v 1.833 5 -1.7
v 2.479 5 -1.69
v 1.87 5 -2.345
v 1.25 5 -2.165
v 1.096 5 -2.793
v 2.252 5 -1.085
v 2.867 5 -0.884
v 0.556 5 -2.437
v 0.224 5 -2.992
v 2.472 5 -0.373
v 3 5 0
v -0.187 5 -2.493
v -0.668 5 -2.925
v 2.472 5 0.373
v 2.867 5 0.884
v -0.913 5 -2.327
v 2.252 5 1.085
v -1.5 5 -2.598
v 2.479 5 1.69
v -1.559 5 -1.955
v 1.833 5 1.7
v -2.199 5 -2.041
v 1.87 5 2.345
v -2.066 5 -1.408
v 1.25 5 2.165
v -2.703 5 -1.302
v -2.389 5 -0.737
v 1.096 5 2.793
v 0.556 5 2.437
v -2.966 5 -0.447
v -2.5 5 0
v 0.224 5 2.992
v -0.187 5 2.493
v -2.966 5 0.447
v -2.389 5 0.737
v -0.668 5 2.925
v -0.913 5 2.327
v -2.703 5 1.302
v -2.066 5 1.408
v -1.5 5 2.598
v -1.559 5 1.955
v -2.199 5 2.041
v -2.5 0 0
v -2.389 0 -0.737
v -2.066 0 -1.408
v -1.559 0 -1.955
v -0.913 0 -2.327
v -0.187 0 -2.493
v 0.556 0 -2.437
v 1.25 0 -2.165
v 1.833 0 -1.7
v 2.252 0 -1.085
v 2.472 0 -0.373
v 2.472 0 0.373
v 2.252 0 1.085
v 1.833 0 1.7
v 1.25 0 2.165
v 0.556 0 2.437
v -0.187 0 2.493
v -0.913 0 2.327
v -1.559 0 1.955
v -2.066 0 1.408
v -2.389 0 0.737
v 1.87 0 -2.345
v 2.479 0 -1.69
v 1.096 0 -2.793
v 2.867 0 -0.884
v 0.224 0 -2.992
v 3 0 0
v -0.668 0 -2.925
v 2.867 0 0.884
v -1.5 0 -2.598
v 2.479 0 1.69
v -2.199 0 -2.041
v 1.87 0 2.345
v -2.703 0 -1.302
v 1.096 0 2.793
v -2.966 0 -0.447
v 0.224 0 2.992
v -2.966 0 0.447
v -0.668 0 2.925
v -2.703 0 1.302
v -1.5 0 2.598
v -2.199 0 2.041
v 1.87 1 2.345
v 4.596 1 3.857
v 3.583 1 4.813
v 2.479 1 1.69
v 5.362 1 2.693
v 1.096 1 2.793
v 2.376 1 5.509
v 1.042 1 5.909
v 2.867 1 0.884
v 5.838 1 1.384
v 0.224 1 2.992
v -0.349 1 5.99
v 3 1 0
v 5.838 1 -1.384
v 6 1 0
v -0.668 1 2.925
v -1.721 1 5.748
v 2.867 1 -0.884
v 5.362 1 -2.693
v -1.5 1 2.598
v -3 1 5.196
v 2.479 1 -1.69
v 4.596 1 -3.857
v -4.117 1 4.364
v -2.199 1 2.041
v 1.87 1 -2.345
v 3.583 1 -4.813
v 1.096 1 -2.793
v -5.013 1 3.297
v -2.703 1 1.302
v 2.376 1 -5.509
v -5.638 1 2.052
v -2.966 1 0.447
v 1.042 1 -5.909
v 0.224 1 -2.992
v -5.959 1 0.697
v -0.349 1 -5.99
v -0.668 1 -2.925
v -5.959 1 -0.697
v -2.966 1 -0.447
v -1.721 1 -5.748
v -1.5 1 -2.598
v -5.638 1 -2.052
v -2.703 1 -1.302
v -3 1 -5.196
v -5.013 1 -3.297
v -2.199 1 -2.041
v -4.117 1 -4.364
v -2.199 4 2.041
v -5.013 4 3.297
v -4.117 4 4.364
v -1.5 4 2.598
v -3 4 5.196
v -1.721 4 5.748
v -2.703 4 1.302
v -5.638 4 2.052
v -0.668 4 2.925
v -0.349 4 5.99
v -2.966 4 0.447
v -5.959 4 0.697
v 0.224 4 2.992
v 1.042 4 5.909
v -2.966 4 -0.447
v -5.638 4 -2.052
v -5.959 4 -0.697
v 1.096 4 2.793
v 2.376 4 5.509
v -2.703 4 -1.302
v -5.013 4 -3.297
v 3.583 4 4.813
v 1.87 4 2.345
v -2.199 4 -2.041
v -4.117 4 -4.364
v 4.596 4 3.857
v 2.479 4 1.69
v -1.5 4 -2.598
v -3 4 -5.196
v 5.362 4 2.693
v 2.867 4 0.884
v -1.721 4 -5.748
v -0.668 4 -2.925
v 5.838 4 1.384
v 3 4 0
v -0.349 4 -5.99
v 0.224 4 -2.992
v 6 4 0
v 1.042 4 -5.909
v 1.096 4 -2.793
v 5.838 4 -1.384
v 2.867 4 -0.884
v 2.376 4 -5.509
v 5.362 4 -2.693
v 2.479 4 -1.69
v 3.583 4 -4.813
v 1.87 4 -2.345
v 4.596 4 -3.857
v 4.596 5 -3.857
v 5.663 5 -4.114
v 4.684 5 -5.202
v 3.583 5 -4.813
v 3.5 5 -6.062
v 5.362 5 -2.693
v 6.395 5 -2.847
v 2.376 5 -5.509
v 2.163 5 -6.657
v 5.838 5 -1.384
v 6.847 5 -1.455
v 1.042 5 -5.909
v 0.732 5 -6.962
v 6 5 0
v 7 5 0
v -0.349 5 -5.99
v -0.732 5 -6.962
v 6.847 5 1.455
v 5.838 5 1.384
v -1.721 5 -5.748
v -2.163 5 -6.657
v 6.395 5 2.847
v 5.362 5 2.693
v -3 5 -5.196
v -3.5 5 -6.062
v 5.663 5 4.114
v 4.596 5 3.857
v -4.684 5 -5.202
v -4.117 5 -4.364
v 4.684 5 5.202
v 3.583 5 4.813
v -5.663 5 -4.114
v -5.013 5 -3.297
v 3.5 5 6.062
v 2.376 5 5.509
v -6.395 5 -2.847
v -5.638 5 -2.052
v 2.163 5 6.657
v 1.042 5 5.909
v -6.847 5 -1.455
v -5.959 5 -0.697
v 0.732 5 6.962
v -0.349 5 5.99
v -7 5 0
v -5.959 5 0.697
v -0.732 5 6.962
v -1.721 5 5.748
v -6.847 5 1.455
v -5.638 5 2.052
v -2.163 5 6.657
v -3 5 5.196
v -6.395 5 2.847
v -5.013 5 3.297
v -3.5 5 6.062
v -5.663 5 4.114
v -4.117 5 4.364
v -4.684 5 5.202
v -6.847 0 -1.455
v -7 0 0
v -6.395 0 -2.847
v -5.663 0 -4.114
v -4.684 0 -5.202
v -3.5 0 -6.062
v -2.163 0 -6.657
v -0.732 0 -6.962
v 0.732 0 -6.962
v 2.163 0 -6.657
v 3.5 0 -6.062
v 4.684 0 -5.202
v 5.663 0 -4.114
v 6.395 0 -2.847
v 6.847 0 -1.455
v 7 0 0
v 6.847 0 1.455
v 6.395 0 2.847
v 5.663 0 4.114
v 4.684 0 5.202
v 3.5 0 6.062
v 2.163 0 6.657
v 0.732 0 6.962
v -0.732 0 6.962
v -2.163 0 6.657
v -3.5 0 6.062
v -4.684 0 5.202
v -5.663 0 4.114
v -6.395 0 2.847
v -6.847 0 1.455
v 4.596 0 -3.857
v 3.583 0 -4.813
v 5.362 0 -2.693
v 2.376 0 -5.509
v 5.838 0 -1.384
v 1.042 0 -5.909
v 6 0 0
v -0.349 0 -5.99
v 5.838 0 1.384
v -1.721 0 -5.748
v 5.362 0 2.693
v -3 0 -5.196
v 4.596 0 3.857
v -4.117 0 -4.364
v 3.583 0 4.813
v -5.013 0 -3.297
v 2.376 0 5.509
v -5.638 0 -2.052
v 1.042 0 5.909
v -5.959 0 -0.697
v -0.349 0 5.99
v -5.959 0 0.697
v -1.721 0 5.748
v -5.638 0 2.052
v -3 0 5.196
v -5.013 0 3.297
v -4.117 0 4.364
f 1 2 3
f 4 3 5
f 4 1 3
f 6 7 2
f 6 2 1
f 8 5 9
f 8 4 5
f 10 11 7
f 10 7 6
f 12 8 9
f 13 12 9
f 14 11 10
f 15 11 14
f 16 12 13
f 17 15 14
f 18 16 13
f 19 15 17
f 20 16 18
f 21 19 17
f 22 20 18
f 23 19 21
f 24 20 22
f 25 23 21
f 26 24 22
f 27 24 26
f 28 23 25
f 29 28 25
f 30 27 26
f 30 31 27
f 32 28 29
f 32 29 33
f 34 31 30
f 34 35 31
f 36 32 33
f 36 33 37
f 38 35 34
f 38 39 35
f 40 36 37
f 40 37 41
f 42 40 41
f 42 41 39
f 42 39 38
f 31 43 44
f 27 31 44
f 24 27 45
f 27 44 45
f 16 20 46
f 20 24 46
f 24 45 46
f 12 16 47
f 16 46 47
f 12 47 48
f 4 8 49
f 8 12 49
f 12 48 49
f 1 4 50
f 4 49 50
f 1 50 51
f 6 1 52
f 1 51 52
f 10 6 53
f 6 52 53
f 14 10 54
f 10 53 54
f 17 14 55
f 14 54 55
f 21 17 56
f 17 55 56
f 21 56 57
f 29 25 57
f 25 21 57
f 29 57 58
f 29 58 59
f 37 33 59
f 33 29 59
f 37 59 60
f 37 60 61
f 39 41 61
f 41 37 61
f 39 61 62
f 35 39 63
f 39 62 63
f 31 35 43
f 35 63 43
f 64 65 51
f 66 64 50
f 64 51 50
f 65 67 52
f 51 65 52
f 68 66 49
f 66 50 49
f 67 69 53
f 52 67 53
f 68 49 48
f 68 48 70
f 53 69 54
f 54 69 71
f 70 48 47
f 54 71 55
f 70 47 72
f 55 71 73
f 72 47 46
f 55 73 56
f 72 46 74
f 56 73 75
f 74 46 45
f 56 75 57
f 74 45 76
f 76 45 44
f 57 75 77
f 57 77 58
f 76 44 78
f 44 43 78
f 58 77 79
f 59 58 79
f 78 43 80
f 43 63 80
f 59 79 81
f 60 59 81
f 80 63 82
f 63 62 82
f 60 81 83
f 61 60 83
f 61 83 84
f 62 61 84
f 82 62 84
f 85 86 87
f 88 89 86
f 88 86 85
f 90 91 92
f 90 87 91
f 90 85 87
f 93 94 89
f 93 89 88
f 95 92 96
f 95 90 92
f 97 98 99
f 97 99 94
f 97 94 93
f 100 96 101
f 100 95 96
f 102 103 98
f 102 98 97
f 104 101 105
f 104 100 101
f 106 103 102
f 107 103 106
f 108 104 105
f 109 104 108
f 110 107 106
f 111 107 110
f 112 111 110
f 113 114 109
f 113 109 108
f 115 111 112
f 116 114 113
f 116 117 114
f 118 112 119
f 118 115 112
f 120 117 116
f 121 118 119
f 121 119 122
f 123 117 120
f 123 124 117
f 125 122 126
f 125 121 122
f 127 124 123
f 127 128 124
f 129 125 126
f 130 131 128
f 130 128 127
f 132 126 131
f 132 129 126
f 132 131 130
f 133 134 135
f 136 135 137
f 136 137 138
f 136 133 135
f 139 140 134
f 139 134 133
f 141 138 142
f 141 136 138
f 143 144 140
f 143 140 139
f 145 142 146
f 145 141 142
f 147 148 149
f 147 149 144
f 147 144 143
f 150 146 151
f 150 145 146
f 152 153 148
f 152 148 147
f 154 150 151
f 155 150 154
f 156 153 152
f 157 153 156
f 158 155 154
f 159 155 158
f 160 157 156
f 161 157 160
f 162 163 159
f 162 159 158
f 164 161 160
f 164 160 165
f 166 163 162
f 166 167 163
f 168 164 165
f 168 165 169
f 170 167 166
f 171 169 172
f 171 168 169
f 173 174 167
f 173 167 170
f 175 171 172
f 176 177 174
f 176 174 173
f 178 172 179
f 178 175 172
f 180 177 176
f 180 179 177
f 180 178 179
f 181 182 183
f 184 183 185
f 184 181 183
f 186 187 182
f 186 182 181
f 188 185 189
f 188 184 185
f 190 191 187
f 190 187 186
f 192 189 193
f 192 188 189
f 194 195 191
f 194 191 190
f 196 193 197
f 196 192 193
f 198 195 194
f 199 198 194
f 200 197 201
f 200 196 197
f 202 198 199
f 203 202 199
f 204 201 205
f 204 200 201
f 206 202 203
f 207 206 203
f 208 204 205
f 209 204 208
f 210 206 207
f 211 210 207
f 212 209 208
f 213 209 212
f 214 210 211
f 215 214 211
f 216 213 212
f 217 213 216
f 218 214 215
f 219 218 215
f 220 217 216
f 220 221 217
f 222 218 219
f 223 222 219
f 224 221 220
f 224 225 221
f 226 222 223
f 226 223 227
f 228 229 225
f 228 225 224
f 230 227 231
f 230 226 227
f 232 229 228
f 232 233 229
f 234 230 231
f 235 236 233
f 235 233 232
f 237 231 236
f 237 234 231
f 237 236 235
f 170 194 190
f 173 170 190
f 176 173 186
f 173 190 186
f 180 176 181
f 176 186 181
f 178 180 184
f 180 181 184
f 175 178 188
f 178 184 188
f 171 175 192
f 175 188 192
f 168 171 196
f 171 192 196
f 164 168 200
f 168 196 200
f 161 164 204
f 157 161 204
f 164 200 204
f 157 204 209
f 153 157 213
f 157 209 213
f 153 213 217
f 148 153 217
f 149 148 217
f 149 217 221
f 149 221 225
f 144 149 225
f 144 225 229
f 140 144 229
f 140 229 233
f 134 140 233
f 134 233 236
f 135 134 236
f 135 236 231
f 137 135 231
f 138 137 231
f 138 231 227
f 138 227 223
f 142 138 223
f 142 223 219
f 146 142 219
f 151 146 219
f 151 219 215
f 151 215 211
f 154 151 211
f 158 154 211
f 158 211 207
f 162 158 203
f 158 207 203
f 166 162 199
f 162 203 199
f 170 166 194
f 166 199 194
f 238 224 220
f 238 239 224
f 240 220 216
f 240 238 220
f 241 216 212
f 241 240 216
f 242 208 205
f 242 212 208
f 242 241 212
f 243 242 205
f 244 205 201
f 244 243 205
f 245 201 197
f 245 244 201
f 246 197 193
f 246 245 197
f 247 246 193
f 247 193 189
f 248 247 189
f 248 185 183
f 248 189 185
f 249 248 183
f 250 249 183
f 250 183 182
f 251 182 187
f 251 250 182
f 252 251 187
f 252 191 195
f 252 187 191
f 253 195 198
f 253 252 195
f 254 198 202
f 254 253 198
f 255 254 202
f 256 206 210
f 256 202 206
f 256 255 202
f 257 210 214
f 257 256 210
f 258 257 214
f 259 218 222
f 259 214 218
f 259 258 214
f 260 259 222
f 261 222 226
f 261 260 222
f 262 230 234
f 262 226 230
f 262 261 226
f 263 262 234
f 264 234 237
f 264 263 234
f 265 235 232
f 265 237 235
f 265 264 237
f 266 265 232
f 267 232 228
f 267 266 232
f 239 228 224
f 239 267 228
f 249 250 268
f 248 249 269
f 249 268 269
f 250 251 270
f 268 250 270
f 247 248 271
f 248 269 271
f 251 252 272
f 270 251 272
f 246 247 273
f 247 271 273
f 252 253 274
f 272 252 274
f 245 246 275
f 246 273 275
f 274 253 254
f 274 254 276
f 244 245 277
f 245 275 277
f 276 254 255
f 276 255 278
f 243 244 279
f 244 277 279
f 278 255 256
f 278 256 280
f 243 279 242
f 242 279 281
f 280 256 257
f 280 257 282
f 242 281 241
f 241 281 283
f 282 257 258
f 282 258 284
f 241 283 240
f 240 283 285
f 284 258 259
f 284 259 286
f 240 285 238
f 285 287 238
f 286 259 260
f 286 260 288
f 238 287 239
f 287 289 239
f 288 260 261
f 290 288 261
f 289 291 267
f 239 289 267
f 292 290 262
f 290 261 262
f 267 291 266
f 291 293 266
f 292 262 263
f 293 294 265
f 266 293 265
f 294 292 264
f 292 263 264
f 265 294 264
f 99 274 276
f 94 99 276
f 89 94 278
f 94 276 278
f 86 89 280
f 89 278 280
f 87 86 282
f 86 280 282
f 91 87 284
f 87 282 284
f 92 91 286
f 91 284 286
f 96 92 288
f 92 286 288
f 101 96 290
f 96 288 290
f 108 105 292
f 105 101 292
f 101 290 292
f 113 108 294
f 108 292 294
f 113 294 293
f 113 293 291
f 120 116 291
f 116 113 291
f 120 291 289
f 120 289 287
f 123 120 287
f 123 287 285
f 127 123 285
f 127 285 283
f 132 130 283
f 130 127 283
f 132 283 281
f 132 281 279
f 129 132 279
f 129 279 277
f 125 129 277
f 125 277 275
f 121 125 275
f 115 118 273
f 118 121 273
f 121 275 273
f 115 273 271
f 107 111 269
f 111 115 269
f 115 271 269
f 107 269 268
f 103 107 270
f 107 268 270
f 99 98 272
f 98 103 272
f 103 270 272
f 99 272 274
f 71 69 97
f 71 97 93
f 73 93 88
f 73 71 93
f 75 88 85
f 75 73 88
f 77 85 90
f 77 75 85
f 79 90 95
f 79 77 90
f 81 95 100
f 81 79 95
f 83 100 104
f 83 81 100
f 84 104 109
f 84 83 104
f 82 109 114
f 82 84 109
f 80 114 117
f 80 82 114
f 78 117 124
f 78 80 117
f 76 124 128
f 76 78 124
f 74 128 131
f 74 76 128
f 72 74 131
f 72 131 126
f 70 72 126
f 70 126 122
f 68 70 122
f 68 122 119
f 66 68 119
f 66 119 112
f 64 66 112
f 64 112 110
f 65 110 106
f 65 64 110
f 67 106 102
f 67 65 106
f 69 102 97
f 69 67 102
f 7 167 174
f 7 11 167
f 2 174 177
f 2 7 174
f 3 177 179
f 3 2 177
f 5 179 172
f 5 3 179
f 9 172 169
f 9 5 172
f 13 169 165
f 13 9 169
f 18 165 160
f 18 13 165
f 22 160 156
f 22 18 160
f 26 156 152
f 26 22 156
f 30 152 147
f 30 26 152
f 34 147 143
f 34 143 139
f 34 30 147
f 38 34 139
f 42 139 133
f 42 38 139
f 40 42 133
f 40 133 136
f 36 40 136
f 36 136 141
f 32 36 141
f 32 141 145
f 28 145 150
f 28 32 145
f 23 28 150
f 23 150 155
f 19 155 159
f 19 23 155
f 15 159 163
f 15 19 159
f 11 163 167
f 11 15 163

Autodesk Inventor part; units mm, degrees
ref_plane "YZ Plane" through (0, 0, 0) normal (1, 0, 0) x (0, 1, 0)
ref_plane "XZ Plane" through (0, 0, 0) normal (0, 1, 0) x (-1, 0, 0)
sketch "Sketch1" plane through (0, 0, 0) normal (0, 1, 0) x (-1, 0, 0)
  circle A0 centre (0, 0) radius 7
  circle A1 centre (0, 0) radius 2.5
  dimension "d0" = 14
  dimension "d1" = 5
extrude "Extrusion1" add sketch "Sketch1" along normal blind 5
sketch "Sketch2" plane through (0, 5, 0) normal (0, 1, 0) x (1, 0, 0)
  circle A0 centre (0, 0) radius 7 projected
  circle A1 centre (0, 0) radius 2.5 projected
  circle A2 centre (0, 0) radius 3
  circle A3 centre (0, 0) radius 6
  dimension "d4" = 6
  dimension "d5" = 1
extrude "Extrusion2" cut sketch "Sketch2" against normal blind 1 contours A3
ref_plane "Work Plane1" through (0, 2.5, 0) normal (0, 1, 0) x (1, 0, 0)
mirror "Mirror1" about plane through (0, 2.5, 0) normal (0, 1, 0) of "Extrusion2"
properties part number "Bearing5X15X5"
